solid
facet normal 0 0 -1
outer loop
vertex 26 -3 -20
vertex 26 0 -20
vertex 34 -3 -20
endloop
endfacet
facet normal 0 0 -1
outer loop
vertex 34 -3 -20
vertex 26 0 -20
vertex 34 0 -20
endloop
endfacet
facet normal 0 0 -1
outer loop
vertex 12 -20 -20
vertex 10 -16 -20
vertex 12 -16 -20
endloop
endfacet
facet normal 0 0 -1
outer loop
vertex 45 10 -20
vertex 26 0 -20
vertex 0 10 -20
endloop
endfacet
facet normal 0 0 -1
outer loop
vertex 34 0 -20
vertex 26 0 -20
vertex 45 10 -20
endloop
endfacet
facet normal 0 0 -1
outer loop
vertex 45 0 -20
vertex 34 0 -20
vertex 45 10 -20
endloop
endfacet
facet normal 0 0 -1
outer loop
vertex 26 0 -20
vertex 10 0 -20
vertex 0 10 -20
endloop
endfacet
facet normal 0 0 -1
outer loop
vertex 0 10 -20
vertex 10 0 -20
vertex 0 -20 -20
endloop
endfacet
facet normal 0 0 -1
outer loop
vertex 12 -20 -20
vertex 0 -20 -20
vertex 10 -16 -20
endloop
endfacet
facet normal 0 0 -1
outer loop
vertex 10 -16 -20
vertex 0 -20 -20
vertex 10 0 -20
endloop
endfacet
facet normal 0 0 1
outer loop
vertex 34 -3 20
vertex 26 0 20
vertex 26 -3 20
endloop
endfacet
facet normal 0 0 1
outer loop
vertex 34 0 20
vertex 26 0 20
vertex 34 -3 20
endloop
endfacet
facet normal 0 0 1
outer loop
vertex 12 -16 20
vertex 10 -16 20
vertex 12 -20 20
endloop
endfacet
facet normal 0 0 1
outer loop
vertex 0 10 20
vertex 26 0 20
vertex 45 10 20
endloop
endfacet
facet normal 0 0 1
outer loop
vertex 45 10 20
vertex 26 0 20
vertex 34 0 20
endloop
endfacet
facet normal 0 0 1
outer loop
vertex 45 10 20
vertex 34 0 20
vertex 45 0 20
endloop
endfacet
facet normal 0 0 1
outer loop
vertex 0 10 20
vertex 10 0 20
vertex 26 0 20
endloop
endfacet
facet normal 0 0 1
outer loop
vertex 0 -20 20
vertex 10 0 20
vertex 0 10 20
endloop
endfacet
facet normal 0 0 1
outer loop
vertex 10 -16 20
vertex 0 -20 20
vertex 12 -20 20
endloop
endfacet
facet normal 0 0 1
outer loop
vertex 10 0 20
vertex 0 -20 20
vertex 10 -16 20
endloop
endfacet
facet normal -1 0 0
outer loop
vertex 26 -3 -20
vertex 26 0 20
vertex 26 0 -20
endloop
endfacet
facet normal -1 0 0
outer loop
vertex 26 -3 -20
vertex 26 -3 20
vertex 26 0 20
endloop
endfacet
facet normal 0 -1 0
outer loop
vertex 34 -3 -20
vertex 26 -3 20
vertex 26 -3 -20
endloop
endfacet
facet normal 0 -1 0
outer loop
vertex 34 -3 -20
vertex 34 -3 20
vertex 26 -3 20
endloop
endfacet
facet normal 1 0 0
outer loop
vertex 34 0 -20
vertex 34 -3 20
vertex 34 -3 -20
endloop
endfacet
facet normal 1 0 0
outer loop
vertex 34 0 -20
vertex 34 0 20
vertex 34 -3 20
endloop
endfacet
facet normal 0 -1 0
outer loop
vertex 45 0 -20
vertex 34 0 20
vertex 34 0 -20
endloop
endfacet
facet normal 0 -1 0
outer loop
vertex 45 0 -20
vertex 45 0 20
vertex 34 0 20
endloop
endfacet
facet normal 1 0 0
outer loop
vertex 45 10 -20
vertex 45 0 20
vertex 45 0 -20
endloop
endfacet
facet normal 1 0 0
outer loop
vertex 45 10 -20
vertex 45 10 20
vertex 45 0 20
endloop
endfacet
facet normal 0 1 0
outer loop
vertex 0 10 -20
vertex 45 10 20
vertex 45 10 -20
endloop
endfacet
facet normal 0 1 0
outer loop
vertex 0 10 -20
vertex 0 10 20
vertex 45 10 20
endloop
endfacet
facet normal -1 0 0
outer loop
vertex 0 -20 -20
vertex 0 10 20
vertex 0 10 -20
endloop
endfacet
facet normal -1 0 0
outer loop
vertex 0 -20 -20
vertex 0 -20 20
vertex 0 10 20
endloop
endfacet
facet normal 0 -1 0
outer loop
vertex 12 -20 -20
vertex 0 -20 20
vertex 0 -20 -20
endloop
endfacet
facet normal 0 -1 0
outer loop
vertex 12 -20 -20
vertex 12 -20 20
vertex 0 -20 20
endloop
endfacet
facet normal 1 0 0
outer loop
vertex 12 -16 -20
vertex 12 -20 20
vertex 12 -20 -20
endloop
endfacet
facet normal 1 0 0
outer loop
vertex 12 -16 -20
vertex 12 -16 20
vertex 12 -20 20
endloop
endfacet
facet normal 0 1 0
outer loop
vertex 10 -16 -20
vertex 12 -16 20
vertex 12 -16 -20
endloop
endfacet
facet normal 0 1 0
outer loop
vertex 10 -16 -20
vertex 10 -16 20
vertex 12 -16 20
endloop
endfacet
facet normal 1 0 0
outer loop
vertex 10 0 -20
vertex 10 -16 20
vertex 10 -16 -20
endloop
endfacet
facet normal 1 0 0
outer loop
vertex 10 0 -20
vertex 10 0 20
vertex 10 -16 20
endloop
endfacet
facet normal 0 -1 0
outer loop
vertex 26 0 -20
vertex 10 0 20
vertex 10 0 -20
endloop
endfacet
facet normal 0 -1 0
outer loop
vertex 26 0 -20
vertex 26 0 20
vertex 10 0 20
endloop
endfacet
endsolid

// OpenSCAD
// profile
pr_side=40;
pr_slot = 8;
pr_wall = 4.5;
// mount bracket
mb_tick = 10;
arm_l = pr_side/2;


module mount_4040(width){
    linear_extrude(height = width, center = true, convexity = 10, twist = 0)
    union() {
        square([pr_side + mb_tick -5, mb_tick]);
       
        // Arm to slot
        translate([0, -arm_l, 0])
            square([mb_tick, arm_l]); 
        
        // Slot insert
        translate([mb_tick , -arm_l, 0])
            square([2, pr_slot/2]);
        
        // slot guide
        translate([pr_side/2 + mb_tick - pr_slot/2 , -3, 0])
            square([pr_slot, 3]);
    }
}

mount_4040(40);
